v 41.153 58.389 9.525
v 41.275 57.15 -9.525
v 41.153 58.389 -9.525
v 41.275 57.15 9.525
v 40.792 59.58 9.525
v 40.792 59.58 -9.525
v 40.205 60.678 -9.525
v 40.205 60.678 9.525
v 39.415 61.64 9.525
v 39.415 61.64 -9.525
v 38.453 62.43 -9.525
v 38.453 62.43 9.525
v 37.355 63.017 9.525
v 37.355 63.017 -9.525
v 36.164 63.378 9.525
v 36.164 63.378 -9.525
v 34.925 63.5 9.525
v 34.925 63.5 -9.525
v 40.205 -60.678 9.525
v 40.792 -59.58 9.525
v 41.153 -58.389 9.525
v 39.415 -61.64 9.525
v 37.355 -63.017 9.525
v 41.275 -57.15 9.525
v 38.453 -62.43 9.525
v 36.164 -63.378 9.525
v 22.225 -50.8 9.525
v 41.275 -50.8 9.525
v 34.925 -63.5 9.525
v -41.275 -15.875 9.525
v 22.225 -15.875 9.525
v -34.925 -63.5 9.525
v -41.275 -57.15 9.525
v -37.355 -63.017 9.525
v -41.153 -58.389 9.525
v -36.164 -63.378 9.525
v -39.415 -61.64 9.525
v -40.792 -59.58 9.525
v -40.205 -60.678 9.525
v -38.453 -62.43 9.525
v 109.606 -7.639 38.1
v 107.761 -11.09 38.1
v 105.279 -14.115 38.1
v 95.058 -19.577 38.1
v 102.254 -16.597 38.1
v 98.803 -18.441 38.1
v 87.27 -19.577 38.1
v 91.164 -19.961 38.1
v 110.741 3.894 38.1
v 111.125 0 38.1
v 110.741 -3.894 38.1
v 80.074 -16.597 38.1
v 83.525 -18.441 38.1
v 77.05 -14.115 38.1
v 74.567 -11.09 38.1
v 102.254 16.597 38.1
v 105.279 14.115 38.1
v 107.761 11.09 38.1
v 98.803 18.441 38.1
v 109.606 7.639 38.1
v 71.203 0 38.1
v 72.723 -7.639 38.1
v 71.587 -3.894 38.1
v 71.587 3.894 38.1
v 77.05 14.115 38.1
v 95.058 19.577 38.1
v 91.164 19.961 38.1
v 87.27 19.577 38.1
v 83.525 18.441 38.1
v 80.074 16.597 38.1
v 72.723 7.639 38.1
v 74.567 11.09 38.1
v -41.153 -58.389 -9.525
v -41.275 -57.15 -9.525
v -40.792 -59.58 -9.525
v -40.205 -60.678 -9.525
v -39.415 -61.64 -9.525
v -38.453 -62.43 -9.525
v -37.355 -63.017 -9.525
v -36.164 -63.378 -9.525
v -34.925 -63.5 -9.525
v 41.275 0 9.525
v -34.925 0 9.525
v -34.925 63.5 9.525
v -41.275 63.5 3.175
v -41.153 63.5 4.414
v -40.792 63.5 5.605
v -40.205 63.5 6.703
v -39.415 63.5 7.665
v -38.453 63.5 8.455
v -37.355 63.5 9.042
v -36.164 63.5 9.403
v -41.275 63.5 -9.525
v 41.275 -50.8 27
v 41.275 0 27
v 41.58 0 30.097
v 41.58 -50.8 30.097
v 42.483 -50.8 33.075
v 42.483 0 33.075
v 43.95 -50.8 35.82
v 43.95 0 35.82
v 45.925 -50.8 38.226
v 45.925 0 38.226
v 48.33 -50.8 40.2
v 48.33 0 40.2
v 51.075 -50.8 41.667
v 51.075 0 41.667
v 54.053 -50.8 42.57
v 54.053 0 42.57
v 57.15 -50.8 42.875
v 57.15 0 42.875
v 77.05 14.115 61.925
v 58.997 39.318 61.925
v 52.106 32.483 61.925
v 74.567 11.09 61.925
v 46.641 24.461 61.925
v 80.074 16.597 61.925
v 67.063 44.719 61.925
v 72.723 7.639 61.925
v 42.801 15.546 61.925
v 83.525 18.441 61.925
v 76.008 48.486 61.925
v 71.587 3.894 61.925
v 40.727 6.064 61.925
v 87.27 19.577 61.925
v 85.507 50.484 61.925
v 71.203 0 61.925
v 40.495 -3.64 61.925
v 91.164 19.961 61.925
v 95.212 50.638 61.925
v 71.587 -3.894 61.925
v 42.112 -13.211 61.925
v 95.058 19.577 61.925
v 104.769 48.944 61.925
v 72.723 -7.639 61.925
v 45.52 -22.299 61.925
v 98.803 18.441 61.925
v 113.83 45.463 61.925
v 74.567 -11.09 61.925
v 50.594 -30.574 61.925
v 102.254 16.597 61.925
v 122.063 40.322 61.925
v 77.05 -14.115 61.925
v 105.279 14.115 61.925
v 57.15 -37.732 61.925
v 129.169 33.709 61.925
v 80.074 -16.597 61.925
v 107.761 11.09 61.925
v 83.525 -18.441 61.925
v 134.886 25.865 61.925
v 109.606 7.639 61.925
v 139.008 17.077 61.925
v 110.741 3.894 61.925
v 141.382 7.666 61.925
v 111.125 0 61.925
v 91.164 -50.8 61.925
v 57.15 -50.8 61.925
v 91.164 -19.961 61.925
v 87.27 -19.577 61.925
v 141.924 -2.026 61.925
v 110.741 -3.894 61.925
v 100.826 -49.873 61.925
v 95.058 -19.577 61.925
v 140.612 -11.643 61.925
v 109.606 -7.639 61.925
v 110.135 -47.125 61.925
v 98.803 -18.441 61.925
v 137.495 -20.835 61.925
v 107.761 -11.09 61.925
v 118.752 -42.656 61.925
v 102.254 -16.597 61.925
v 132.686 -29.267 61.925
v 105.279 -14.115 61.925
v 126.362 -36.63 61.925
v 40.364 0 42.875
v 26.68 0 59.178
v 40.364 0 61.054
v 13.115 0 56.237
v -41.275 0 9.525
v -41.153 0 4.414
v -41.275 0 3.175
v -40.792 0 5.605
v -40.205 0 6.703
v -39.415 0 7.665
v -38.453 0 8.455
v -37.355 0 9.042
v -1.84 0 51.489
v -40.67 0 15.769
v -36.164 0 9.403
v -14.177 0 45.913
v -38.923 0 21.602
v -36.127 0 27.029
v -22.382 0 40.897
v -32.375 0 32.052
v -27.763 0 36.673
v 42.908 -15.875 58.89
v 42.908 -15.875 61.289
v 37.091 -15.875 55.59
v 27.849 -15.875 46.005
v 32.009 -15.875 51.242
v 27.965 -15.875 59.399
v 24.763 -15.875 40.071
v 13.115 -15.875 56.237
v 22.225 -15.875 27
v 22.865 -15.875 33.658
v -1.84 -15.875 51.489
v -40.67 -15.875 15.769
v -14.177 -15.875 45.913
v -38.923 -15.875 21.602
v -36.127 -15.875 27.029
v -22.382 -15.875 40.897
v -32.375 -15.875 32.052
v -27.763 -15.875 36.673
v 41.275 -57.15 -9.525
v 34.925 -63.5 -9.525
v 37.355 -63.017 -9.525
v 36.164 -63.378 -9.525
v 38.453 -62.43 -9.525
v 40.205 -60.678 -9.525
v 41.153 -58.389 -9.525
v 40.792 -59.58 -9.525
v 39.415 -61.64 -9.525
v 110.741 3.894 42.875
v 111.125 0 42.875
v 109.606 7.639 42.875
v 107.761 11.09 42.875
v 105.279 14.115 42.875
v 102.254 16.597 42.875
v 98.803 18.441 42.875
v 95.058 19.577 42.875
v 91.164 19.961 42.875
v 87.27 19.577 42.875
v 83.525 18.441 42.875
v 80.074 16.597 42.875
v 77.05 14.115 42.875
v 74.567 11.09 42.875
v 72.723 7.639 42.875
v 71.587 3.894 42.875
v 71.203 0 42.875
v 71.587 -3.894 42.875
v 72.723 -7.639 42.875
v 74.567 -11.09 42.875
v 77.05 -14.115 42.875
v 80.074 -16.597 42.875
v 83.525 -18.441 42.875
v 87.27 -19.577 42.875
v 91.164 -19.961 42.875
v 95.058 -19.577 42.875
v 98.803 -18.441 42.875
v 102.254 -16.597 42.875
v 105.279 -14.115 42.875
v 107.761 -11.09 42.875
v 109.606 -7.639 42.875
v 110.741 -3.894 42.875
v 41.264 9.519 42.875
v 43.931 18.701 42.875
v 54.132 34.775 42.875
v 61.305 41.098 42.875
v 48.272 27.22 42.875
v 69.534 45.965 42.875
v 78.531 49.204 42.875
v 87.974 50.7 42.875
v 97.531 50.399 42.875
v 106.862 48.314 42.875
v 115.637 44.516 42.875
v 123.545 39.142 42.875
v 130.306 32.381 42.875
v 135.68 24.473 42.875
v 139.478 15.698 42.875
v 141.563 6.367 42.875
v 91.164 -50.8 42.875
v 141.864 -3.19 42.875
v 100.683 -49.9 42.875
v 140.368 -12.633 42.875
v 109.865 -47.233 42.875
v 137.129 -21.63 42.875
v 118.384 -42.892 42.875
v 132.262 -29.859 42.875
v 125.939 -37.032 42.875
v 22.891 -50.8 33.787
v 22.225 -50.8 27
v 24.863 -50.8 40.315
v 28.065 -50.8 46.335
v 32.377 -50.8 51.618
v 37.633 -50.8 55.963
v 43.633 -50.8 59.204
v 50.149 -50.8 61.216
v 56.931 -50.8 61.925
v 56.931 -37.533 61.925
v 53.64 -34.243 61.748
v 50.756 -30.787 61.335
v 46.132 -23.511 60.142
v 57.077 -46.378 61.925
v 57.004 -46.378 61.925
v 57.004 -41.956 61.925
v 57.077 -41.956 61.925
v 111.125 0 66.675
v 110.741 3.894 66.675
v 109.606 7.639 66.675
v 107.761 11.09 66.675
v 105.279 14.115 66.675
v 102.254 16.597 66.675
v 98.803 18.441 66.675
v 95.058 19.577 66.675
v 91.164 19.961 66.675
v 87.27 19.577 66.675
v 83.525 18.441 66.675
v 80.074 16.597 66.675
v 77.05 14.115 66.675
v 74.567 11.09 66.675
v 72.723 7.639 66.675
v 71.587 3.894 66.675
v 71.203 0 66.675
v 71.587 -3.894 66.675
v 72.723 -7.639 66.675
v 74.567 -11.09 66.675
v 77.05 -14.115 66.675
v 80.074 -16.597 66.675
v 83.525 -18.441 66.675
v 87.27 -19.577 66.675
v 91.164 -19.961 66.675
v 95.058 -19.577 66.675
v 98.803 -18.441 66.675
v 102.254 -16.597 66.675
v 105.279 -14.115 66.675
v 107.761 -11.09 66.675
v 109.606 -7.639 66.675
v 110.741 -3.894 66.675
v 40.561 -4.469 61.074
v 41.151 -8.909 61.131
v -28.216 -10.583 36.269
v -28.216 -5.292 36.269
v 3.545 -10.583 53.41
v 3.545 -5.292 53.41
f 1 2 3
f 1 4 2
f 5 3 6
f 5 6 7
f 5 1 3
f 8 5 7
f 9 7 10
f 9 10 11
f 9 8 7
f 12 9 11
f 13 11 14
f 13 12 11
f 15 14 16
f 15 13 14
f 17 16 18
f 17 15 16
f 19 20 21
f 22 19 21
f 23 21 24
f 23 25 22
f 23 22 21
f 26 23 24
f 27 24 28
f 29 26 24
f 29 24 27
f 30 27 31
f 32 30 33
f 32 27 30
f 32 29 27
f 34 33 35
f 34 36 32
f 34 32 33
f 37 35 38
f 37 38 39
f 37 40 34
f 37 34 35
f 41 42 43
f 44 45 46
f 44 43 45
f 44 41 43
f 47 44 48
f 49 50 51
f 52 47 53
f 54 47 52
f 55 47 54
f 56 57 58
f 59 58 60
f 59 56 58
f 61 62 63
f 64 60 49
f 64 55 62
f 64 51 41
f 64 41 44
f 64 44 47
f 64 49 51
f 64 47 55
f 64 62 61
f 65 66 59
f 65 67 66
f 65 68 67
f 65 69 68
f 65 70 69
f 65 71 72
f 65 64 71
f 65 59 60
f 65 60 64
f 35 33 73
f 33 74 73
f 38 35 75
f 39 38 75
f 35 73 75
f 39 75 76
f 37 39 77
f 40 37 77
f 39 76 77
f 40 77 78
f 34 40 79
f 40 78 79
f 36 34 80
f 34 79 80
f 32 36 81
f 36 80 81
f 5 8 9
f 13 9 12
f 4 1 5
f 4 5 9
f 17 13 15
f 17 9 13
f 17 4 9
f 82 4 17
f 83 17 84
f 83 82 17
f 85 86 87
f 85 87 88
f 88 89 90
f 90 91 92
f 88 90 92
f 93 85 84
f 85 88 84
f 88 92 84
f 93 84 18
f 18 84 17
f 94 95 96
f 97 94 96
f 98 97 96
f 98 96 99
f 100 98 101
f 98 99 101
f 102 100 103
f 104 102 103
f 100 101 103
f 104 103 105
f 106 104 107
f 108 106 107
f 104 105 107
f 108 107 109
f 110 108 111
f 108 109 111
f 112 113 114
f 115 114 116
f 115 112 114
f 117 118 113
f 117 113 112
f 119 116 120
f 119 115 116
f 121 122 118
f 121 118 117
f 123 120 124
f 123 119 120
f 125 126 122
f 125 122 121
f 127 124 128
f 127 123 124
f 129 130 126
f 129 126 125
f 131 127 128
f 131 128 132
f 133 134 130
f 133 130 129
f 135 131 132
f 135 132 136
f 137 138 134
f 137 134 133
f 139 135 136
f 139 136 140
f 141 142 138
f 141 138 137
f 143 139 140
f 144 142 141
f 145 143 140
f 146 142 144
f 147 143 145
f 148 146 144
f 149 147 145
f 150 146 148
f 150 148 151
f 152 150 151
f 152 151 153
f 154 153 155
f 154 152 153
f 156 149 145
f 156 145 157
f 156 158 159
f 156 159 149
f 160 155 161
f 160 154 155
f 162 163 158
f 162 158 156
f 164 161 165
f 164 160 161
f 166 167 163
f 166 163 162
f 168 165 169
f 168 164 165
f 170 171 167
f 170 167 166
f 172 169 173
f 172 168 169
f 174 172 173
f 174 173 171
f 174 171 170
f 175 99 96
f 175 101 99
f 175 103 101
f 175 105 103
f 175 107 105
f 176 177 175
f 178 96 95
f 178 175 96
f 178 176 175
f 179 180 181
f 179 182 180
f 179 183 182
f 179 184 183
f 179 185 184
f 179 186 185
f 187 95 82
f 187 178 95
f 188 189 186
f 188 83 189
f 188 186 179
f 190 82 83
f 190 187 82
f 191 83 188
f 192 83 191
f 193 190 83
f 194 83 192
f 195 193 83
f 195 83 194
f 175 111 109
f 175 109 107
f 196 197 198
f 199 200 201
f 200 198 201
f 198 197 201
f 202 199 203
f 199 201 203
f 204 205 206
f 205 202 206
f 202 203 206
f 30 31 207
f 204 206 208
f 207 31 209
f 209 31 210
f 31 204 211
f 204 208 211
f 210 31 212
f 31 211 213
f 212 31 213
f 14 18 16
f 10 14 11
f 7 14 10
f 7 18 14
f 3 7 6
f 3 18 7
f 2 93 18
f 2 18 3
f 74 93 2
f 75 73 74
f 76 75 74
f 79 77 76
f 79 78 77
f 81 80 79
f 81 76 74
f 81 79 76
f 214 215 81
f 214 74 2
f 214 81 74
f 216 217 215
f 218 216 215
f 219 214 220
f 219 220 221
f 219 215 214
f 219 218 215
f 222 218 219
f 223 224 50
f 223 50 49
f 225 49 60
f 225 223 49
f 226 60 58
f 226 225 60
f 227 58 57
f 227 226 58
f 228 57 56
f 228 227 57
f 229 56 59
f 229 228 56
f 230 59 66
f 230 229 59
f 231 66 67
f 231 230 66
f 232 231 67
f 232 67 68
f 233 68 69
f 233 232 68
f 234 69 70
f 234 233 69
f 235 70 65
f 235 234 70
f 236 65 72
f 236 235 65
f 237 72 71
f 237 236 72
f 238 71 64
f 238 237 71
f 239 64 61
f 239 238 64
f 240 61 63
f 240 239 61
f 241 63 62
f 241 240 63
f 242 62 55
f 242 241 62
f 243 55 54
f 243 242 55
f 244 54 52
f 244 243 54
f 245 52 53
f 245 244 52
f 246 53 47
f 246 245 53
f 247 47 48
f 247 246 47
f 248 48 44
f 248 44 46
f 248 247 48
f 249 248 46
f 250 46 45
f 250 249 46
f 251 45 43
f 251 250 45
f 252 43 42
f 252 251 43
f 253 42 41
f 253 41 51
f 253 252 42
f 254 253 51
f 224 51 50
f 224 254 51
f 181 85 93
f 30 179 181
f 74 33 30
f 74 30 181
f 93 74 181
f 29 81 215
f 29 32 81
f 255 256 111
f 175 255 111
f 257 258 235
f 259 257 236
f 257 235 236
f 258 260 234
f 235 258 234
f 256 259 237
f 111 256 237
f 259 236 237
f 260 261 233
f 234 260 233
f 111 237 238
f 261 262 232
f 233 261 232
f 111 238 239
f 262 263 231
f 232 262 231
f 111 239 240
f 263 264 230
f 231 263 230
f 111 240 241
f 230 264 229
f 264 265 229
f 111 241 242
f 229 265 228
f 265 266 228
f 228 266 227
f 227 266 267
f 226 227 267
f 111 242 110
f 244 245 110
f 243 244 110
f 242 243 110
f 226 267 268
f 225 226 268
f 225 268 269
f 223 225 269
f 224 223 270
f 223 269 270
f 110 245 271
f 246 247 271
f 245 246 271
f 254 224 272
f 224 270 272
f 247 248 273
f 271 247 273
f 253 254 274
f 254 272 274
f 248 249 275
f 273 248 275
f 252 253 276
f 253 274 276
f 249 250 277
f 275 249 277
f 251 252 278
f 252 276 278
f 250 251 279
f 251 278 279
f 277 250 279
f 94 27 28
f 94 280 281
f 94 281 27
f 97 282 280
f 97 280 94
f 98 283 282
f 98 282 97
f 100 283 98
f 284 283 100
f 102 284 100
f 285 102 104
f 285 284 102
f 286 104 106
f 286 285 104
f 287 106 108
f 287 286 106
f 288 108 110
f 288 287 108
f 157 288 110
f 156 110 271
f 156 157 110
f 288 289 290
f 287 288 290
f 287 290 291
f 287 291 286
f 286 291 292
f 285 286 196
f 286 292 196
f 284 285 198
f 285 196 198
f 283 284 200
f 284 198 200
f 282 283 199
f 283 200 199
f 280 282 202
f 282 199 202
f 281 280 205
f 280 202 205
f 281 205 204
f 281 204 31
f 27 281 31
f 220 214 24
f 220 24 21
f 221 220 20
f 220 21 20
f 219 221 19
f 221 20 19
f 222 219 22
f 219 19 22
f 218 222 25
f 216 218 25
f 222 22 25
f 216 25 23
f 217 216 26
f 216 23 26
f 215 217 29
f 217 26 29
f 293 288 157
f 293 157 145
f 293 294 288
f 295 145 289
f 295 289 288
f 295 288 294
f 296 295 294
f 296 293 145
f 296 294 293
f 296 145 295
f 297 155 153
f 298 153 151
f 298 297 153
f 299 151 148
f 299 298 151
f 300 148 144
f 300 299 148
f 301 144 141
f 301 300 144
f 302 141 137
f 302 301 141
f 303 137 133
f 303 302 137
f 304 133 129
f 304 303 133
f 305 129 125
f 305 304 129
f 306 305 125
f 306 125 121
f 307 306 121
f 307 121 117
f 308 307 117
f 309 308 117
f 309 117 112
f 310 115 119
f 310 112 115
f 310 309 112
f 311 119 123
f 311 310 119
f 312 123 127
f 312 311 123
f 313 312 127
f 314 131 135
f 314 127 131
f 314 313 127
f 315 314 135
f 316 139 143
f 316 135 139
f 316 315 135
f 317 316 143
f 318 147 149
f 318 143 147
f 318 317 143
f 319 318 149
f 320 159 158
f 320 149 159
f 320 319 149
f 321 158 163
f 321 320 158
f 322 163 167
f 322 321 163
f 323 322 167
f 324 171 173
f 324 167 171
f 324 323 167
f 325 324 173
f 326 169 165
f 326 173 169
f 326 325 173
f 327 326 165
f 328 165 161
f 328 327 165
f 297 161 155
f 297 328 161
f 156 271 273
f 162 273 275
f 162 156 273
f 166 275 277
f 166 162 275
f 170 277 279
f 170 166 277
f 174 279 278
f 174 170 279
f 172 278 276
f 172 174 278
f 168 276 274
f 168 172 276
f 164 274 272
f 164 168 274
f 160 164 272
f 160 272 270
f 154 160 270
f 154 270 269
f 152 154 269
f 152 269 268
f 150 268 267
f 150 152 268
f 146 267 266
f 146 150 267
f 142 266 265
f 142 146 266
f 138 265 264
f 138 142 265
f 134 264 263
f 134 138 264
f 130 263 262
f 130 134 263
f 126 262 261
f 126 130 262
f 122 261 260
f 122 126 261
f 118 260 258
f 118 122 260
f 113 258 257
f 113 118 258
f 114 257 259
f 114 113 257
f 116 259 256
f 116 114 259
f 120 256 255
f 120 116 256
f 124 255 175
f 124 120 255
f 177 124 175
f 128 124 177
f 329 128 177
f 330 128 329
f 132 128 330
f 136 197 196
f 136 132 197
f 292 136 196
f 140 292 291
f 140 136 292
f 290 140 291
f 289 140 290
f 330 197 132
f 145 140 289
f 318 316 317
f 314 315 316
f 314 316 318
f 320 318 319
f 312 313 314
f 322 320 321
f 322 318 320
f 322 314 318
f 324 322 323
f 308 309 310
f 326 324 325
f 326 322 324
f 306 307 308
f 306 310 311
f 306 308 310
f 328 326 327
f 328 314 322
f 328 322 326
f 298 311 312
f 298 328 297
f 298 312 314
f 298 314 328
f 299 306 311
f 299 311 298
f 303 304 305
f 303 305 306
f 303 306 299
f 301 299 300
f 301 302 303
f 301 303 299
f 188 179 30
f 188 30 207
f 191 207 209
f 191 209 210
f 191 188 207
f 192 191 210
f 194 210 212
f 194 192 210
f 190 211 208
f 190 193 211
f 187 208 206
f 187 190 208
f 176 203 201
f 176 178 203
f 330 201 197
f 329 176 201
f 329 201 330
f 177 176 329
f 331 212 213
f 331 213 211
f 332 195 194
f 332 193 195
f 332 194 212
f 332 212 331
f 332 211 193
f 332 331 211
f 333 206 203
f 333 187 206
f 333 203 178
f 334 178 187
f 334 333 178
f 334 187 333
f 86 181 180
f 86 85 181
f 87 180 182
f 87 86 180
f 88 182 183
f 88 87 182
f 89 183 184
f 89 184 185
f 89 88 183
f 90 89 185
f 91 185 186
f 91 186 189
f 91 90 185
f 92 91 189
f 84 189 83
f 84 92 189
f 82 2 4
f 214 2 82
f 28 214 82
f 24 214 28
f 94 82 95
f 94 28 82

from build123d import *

# Parameters (mm, degrees)
F1_DEPTH  = 63.5
F0_W      = 30.8390699949
F0_H      = 19.05
F2_DEPTH  = 50.8
F3_DEPTH  = 15.875
F2_FACE_W = 50.8
F2_FACE_H = 19.05
F5_R      = 6.35


with BuildPart() as f1:
    # F0 (on Front) → F1 (new body, symmetric)
    with BuildSketch(Plane.XZ):
        Polygon((-41.275, -9.525), (41.275, -9.525), (41.275, 9.525), (22.225, 9.525), (-41.275, 9.525), align=None)
    extrude(amount=F1_DEPTH, both=True)

    # F0 (on Front) → F2 (join)
    with BuildSketch(Plane.XZ):
        with BuildLine():
            Line((22.225, 9.525), (41.275, 9.525))
            Line((41.275, 9.525), (41.275, 27.0002))
            ThreePointArc((41.275, 27.0002), (45.9246798487, 38.2255201513), (57.15, 42.8752))
            Line((57.15, 42.8752), (60.325, 42.8752))
            Line((60.325, 42.8752), (60.325, 61.9252))
            Line((60.325, 61.9252), (57.15, 61.9252))
            add(Edge.make_bspline(
                [(56.931387773, 61.9245157942), (57.0043014085, 61.9247938366), (57.0771722736, 61.9250219014), (57.15, 61.9252)],
                knots=[111.311302115, 111.311302115, 111.311302115, 111.311302115, 111.5045361635, 111.5045361635, 111.5045361635, 111.5045361635], degree=3))
            ThreePointArc((56.931387773, 61.9245157942), (32.3771251463, 51.6184919084), (22.225, 27.0002))
            Line((22.225, 27.0002), (22.225, 9.525))
        make_face()
        with Locations((75.7445349974, 52.4002)):
            Rectangle(F0_W, F0_H)
    extrude(amount=F2_DEPTH)

    # F0 (on Front) → F3 (join)
    with BuildSketch(Plane.XZ):
        with BuildLine():
            add(Edge.make_bspline(
                [(-41.275, 9.525), (-41.2639124943, 45.0202943965), (14.9299300749, 61.764351157), (56.931387773, 61.9245157942)],
                knots=[0, 0, 0, 0, 111.311302115, 111.311302115, 111.311302115, 111.311302115], degree=3))
            Line((-41.275, 9.525), (22.225, 9.525))
            Line((22.225, 9.525), (22.225, 27.0002))
            ThreePointArc((22.225, 27.0002), (32.3771251463, 51.6184919084), (56.931387773, 61.9245157942))
        make_face()
    extrude(amount=F3_DEPTH)

    # F0 (on Front) + F2_face (on face) → F4 (revolve)
    with BuildSketch(Plane.XZ):
        Polygon((91.1640699949, 61.9252), (91.1640699949, 42.8752), (91.1640699949, 38.1), (111.125, 38.1), (111.125, 66.675), (91.1640699949, 66.675), align=None)
    with BuildSketch(Plane(origin=(91.1640699949, -25.4, 52.4002), x_dir=(0, 1, 0), z_dir=(1, 0, 0))):
        Rectangle(F2_FACE_W, F2_FACE_H)
    revolve(axis=Axis((91.1640699949, 0, 52.3875), (0, 0, 1)))

    # F5
    f5_edges = [f1.edges().sort_by_distance(p)[0] for p in [
        (41.275, -63.5, 0),
        (-41.275, -63.5, 0),
        (-41.275, 31.75, 9.525),
        (41.275, 63.5, 0),
    ]]
    fillet(f5_edges, radius=F5_R)


solid = f1.part
